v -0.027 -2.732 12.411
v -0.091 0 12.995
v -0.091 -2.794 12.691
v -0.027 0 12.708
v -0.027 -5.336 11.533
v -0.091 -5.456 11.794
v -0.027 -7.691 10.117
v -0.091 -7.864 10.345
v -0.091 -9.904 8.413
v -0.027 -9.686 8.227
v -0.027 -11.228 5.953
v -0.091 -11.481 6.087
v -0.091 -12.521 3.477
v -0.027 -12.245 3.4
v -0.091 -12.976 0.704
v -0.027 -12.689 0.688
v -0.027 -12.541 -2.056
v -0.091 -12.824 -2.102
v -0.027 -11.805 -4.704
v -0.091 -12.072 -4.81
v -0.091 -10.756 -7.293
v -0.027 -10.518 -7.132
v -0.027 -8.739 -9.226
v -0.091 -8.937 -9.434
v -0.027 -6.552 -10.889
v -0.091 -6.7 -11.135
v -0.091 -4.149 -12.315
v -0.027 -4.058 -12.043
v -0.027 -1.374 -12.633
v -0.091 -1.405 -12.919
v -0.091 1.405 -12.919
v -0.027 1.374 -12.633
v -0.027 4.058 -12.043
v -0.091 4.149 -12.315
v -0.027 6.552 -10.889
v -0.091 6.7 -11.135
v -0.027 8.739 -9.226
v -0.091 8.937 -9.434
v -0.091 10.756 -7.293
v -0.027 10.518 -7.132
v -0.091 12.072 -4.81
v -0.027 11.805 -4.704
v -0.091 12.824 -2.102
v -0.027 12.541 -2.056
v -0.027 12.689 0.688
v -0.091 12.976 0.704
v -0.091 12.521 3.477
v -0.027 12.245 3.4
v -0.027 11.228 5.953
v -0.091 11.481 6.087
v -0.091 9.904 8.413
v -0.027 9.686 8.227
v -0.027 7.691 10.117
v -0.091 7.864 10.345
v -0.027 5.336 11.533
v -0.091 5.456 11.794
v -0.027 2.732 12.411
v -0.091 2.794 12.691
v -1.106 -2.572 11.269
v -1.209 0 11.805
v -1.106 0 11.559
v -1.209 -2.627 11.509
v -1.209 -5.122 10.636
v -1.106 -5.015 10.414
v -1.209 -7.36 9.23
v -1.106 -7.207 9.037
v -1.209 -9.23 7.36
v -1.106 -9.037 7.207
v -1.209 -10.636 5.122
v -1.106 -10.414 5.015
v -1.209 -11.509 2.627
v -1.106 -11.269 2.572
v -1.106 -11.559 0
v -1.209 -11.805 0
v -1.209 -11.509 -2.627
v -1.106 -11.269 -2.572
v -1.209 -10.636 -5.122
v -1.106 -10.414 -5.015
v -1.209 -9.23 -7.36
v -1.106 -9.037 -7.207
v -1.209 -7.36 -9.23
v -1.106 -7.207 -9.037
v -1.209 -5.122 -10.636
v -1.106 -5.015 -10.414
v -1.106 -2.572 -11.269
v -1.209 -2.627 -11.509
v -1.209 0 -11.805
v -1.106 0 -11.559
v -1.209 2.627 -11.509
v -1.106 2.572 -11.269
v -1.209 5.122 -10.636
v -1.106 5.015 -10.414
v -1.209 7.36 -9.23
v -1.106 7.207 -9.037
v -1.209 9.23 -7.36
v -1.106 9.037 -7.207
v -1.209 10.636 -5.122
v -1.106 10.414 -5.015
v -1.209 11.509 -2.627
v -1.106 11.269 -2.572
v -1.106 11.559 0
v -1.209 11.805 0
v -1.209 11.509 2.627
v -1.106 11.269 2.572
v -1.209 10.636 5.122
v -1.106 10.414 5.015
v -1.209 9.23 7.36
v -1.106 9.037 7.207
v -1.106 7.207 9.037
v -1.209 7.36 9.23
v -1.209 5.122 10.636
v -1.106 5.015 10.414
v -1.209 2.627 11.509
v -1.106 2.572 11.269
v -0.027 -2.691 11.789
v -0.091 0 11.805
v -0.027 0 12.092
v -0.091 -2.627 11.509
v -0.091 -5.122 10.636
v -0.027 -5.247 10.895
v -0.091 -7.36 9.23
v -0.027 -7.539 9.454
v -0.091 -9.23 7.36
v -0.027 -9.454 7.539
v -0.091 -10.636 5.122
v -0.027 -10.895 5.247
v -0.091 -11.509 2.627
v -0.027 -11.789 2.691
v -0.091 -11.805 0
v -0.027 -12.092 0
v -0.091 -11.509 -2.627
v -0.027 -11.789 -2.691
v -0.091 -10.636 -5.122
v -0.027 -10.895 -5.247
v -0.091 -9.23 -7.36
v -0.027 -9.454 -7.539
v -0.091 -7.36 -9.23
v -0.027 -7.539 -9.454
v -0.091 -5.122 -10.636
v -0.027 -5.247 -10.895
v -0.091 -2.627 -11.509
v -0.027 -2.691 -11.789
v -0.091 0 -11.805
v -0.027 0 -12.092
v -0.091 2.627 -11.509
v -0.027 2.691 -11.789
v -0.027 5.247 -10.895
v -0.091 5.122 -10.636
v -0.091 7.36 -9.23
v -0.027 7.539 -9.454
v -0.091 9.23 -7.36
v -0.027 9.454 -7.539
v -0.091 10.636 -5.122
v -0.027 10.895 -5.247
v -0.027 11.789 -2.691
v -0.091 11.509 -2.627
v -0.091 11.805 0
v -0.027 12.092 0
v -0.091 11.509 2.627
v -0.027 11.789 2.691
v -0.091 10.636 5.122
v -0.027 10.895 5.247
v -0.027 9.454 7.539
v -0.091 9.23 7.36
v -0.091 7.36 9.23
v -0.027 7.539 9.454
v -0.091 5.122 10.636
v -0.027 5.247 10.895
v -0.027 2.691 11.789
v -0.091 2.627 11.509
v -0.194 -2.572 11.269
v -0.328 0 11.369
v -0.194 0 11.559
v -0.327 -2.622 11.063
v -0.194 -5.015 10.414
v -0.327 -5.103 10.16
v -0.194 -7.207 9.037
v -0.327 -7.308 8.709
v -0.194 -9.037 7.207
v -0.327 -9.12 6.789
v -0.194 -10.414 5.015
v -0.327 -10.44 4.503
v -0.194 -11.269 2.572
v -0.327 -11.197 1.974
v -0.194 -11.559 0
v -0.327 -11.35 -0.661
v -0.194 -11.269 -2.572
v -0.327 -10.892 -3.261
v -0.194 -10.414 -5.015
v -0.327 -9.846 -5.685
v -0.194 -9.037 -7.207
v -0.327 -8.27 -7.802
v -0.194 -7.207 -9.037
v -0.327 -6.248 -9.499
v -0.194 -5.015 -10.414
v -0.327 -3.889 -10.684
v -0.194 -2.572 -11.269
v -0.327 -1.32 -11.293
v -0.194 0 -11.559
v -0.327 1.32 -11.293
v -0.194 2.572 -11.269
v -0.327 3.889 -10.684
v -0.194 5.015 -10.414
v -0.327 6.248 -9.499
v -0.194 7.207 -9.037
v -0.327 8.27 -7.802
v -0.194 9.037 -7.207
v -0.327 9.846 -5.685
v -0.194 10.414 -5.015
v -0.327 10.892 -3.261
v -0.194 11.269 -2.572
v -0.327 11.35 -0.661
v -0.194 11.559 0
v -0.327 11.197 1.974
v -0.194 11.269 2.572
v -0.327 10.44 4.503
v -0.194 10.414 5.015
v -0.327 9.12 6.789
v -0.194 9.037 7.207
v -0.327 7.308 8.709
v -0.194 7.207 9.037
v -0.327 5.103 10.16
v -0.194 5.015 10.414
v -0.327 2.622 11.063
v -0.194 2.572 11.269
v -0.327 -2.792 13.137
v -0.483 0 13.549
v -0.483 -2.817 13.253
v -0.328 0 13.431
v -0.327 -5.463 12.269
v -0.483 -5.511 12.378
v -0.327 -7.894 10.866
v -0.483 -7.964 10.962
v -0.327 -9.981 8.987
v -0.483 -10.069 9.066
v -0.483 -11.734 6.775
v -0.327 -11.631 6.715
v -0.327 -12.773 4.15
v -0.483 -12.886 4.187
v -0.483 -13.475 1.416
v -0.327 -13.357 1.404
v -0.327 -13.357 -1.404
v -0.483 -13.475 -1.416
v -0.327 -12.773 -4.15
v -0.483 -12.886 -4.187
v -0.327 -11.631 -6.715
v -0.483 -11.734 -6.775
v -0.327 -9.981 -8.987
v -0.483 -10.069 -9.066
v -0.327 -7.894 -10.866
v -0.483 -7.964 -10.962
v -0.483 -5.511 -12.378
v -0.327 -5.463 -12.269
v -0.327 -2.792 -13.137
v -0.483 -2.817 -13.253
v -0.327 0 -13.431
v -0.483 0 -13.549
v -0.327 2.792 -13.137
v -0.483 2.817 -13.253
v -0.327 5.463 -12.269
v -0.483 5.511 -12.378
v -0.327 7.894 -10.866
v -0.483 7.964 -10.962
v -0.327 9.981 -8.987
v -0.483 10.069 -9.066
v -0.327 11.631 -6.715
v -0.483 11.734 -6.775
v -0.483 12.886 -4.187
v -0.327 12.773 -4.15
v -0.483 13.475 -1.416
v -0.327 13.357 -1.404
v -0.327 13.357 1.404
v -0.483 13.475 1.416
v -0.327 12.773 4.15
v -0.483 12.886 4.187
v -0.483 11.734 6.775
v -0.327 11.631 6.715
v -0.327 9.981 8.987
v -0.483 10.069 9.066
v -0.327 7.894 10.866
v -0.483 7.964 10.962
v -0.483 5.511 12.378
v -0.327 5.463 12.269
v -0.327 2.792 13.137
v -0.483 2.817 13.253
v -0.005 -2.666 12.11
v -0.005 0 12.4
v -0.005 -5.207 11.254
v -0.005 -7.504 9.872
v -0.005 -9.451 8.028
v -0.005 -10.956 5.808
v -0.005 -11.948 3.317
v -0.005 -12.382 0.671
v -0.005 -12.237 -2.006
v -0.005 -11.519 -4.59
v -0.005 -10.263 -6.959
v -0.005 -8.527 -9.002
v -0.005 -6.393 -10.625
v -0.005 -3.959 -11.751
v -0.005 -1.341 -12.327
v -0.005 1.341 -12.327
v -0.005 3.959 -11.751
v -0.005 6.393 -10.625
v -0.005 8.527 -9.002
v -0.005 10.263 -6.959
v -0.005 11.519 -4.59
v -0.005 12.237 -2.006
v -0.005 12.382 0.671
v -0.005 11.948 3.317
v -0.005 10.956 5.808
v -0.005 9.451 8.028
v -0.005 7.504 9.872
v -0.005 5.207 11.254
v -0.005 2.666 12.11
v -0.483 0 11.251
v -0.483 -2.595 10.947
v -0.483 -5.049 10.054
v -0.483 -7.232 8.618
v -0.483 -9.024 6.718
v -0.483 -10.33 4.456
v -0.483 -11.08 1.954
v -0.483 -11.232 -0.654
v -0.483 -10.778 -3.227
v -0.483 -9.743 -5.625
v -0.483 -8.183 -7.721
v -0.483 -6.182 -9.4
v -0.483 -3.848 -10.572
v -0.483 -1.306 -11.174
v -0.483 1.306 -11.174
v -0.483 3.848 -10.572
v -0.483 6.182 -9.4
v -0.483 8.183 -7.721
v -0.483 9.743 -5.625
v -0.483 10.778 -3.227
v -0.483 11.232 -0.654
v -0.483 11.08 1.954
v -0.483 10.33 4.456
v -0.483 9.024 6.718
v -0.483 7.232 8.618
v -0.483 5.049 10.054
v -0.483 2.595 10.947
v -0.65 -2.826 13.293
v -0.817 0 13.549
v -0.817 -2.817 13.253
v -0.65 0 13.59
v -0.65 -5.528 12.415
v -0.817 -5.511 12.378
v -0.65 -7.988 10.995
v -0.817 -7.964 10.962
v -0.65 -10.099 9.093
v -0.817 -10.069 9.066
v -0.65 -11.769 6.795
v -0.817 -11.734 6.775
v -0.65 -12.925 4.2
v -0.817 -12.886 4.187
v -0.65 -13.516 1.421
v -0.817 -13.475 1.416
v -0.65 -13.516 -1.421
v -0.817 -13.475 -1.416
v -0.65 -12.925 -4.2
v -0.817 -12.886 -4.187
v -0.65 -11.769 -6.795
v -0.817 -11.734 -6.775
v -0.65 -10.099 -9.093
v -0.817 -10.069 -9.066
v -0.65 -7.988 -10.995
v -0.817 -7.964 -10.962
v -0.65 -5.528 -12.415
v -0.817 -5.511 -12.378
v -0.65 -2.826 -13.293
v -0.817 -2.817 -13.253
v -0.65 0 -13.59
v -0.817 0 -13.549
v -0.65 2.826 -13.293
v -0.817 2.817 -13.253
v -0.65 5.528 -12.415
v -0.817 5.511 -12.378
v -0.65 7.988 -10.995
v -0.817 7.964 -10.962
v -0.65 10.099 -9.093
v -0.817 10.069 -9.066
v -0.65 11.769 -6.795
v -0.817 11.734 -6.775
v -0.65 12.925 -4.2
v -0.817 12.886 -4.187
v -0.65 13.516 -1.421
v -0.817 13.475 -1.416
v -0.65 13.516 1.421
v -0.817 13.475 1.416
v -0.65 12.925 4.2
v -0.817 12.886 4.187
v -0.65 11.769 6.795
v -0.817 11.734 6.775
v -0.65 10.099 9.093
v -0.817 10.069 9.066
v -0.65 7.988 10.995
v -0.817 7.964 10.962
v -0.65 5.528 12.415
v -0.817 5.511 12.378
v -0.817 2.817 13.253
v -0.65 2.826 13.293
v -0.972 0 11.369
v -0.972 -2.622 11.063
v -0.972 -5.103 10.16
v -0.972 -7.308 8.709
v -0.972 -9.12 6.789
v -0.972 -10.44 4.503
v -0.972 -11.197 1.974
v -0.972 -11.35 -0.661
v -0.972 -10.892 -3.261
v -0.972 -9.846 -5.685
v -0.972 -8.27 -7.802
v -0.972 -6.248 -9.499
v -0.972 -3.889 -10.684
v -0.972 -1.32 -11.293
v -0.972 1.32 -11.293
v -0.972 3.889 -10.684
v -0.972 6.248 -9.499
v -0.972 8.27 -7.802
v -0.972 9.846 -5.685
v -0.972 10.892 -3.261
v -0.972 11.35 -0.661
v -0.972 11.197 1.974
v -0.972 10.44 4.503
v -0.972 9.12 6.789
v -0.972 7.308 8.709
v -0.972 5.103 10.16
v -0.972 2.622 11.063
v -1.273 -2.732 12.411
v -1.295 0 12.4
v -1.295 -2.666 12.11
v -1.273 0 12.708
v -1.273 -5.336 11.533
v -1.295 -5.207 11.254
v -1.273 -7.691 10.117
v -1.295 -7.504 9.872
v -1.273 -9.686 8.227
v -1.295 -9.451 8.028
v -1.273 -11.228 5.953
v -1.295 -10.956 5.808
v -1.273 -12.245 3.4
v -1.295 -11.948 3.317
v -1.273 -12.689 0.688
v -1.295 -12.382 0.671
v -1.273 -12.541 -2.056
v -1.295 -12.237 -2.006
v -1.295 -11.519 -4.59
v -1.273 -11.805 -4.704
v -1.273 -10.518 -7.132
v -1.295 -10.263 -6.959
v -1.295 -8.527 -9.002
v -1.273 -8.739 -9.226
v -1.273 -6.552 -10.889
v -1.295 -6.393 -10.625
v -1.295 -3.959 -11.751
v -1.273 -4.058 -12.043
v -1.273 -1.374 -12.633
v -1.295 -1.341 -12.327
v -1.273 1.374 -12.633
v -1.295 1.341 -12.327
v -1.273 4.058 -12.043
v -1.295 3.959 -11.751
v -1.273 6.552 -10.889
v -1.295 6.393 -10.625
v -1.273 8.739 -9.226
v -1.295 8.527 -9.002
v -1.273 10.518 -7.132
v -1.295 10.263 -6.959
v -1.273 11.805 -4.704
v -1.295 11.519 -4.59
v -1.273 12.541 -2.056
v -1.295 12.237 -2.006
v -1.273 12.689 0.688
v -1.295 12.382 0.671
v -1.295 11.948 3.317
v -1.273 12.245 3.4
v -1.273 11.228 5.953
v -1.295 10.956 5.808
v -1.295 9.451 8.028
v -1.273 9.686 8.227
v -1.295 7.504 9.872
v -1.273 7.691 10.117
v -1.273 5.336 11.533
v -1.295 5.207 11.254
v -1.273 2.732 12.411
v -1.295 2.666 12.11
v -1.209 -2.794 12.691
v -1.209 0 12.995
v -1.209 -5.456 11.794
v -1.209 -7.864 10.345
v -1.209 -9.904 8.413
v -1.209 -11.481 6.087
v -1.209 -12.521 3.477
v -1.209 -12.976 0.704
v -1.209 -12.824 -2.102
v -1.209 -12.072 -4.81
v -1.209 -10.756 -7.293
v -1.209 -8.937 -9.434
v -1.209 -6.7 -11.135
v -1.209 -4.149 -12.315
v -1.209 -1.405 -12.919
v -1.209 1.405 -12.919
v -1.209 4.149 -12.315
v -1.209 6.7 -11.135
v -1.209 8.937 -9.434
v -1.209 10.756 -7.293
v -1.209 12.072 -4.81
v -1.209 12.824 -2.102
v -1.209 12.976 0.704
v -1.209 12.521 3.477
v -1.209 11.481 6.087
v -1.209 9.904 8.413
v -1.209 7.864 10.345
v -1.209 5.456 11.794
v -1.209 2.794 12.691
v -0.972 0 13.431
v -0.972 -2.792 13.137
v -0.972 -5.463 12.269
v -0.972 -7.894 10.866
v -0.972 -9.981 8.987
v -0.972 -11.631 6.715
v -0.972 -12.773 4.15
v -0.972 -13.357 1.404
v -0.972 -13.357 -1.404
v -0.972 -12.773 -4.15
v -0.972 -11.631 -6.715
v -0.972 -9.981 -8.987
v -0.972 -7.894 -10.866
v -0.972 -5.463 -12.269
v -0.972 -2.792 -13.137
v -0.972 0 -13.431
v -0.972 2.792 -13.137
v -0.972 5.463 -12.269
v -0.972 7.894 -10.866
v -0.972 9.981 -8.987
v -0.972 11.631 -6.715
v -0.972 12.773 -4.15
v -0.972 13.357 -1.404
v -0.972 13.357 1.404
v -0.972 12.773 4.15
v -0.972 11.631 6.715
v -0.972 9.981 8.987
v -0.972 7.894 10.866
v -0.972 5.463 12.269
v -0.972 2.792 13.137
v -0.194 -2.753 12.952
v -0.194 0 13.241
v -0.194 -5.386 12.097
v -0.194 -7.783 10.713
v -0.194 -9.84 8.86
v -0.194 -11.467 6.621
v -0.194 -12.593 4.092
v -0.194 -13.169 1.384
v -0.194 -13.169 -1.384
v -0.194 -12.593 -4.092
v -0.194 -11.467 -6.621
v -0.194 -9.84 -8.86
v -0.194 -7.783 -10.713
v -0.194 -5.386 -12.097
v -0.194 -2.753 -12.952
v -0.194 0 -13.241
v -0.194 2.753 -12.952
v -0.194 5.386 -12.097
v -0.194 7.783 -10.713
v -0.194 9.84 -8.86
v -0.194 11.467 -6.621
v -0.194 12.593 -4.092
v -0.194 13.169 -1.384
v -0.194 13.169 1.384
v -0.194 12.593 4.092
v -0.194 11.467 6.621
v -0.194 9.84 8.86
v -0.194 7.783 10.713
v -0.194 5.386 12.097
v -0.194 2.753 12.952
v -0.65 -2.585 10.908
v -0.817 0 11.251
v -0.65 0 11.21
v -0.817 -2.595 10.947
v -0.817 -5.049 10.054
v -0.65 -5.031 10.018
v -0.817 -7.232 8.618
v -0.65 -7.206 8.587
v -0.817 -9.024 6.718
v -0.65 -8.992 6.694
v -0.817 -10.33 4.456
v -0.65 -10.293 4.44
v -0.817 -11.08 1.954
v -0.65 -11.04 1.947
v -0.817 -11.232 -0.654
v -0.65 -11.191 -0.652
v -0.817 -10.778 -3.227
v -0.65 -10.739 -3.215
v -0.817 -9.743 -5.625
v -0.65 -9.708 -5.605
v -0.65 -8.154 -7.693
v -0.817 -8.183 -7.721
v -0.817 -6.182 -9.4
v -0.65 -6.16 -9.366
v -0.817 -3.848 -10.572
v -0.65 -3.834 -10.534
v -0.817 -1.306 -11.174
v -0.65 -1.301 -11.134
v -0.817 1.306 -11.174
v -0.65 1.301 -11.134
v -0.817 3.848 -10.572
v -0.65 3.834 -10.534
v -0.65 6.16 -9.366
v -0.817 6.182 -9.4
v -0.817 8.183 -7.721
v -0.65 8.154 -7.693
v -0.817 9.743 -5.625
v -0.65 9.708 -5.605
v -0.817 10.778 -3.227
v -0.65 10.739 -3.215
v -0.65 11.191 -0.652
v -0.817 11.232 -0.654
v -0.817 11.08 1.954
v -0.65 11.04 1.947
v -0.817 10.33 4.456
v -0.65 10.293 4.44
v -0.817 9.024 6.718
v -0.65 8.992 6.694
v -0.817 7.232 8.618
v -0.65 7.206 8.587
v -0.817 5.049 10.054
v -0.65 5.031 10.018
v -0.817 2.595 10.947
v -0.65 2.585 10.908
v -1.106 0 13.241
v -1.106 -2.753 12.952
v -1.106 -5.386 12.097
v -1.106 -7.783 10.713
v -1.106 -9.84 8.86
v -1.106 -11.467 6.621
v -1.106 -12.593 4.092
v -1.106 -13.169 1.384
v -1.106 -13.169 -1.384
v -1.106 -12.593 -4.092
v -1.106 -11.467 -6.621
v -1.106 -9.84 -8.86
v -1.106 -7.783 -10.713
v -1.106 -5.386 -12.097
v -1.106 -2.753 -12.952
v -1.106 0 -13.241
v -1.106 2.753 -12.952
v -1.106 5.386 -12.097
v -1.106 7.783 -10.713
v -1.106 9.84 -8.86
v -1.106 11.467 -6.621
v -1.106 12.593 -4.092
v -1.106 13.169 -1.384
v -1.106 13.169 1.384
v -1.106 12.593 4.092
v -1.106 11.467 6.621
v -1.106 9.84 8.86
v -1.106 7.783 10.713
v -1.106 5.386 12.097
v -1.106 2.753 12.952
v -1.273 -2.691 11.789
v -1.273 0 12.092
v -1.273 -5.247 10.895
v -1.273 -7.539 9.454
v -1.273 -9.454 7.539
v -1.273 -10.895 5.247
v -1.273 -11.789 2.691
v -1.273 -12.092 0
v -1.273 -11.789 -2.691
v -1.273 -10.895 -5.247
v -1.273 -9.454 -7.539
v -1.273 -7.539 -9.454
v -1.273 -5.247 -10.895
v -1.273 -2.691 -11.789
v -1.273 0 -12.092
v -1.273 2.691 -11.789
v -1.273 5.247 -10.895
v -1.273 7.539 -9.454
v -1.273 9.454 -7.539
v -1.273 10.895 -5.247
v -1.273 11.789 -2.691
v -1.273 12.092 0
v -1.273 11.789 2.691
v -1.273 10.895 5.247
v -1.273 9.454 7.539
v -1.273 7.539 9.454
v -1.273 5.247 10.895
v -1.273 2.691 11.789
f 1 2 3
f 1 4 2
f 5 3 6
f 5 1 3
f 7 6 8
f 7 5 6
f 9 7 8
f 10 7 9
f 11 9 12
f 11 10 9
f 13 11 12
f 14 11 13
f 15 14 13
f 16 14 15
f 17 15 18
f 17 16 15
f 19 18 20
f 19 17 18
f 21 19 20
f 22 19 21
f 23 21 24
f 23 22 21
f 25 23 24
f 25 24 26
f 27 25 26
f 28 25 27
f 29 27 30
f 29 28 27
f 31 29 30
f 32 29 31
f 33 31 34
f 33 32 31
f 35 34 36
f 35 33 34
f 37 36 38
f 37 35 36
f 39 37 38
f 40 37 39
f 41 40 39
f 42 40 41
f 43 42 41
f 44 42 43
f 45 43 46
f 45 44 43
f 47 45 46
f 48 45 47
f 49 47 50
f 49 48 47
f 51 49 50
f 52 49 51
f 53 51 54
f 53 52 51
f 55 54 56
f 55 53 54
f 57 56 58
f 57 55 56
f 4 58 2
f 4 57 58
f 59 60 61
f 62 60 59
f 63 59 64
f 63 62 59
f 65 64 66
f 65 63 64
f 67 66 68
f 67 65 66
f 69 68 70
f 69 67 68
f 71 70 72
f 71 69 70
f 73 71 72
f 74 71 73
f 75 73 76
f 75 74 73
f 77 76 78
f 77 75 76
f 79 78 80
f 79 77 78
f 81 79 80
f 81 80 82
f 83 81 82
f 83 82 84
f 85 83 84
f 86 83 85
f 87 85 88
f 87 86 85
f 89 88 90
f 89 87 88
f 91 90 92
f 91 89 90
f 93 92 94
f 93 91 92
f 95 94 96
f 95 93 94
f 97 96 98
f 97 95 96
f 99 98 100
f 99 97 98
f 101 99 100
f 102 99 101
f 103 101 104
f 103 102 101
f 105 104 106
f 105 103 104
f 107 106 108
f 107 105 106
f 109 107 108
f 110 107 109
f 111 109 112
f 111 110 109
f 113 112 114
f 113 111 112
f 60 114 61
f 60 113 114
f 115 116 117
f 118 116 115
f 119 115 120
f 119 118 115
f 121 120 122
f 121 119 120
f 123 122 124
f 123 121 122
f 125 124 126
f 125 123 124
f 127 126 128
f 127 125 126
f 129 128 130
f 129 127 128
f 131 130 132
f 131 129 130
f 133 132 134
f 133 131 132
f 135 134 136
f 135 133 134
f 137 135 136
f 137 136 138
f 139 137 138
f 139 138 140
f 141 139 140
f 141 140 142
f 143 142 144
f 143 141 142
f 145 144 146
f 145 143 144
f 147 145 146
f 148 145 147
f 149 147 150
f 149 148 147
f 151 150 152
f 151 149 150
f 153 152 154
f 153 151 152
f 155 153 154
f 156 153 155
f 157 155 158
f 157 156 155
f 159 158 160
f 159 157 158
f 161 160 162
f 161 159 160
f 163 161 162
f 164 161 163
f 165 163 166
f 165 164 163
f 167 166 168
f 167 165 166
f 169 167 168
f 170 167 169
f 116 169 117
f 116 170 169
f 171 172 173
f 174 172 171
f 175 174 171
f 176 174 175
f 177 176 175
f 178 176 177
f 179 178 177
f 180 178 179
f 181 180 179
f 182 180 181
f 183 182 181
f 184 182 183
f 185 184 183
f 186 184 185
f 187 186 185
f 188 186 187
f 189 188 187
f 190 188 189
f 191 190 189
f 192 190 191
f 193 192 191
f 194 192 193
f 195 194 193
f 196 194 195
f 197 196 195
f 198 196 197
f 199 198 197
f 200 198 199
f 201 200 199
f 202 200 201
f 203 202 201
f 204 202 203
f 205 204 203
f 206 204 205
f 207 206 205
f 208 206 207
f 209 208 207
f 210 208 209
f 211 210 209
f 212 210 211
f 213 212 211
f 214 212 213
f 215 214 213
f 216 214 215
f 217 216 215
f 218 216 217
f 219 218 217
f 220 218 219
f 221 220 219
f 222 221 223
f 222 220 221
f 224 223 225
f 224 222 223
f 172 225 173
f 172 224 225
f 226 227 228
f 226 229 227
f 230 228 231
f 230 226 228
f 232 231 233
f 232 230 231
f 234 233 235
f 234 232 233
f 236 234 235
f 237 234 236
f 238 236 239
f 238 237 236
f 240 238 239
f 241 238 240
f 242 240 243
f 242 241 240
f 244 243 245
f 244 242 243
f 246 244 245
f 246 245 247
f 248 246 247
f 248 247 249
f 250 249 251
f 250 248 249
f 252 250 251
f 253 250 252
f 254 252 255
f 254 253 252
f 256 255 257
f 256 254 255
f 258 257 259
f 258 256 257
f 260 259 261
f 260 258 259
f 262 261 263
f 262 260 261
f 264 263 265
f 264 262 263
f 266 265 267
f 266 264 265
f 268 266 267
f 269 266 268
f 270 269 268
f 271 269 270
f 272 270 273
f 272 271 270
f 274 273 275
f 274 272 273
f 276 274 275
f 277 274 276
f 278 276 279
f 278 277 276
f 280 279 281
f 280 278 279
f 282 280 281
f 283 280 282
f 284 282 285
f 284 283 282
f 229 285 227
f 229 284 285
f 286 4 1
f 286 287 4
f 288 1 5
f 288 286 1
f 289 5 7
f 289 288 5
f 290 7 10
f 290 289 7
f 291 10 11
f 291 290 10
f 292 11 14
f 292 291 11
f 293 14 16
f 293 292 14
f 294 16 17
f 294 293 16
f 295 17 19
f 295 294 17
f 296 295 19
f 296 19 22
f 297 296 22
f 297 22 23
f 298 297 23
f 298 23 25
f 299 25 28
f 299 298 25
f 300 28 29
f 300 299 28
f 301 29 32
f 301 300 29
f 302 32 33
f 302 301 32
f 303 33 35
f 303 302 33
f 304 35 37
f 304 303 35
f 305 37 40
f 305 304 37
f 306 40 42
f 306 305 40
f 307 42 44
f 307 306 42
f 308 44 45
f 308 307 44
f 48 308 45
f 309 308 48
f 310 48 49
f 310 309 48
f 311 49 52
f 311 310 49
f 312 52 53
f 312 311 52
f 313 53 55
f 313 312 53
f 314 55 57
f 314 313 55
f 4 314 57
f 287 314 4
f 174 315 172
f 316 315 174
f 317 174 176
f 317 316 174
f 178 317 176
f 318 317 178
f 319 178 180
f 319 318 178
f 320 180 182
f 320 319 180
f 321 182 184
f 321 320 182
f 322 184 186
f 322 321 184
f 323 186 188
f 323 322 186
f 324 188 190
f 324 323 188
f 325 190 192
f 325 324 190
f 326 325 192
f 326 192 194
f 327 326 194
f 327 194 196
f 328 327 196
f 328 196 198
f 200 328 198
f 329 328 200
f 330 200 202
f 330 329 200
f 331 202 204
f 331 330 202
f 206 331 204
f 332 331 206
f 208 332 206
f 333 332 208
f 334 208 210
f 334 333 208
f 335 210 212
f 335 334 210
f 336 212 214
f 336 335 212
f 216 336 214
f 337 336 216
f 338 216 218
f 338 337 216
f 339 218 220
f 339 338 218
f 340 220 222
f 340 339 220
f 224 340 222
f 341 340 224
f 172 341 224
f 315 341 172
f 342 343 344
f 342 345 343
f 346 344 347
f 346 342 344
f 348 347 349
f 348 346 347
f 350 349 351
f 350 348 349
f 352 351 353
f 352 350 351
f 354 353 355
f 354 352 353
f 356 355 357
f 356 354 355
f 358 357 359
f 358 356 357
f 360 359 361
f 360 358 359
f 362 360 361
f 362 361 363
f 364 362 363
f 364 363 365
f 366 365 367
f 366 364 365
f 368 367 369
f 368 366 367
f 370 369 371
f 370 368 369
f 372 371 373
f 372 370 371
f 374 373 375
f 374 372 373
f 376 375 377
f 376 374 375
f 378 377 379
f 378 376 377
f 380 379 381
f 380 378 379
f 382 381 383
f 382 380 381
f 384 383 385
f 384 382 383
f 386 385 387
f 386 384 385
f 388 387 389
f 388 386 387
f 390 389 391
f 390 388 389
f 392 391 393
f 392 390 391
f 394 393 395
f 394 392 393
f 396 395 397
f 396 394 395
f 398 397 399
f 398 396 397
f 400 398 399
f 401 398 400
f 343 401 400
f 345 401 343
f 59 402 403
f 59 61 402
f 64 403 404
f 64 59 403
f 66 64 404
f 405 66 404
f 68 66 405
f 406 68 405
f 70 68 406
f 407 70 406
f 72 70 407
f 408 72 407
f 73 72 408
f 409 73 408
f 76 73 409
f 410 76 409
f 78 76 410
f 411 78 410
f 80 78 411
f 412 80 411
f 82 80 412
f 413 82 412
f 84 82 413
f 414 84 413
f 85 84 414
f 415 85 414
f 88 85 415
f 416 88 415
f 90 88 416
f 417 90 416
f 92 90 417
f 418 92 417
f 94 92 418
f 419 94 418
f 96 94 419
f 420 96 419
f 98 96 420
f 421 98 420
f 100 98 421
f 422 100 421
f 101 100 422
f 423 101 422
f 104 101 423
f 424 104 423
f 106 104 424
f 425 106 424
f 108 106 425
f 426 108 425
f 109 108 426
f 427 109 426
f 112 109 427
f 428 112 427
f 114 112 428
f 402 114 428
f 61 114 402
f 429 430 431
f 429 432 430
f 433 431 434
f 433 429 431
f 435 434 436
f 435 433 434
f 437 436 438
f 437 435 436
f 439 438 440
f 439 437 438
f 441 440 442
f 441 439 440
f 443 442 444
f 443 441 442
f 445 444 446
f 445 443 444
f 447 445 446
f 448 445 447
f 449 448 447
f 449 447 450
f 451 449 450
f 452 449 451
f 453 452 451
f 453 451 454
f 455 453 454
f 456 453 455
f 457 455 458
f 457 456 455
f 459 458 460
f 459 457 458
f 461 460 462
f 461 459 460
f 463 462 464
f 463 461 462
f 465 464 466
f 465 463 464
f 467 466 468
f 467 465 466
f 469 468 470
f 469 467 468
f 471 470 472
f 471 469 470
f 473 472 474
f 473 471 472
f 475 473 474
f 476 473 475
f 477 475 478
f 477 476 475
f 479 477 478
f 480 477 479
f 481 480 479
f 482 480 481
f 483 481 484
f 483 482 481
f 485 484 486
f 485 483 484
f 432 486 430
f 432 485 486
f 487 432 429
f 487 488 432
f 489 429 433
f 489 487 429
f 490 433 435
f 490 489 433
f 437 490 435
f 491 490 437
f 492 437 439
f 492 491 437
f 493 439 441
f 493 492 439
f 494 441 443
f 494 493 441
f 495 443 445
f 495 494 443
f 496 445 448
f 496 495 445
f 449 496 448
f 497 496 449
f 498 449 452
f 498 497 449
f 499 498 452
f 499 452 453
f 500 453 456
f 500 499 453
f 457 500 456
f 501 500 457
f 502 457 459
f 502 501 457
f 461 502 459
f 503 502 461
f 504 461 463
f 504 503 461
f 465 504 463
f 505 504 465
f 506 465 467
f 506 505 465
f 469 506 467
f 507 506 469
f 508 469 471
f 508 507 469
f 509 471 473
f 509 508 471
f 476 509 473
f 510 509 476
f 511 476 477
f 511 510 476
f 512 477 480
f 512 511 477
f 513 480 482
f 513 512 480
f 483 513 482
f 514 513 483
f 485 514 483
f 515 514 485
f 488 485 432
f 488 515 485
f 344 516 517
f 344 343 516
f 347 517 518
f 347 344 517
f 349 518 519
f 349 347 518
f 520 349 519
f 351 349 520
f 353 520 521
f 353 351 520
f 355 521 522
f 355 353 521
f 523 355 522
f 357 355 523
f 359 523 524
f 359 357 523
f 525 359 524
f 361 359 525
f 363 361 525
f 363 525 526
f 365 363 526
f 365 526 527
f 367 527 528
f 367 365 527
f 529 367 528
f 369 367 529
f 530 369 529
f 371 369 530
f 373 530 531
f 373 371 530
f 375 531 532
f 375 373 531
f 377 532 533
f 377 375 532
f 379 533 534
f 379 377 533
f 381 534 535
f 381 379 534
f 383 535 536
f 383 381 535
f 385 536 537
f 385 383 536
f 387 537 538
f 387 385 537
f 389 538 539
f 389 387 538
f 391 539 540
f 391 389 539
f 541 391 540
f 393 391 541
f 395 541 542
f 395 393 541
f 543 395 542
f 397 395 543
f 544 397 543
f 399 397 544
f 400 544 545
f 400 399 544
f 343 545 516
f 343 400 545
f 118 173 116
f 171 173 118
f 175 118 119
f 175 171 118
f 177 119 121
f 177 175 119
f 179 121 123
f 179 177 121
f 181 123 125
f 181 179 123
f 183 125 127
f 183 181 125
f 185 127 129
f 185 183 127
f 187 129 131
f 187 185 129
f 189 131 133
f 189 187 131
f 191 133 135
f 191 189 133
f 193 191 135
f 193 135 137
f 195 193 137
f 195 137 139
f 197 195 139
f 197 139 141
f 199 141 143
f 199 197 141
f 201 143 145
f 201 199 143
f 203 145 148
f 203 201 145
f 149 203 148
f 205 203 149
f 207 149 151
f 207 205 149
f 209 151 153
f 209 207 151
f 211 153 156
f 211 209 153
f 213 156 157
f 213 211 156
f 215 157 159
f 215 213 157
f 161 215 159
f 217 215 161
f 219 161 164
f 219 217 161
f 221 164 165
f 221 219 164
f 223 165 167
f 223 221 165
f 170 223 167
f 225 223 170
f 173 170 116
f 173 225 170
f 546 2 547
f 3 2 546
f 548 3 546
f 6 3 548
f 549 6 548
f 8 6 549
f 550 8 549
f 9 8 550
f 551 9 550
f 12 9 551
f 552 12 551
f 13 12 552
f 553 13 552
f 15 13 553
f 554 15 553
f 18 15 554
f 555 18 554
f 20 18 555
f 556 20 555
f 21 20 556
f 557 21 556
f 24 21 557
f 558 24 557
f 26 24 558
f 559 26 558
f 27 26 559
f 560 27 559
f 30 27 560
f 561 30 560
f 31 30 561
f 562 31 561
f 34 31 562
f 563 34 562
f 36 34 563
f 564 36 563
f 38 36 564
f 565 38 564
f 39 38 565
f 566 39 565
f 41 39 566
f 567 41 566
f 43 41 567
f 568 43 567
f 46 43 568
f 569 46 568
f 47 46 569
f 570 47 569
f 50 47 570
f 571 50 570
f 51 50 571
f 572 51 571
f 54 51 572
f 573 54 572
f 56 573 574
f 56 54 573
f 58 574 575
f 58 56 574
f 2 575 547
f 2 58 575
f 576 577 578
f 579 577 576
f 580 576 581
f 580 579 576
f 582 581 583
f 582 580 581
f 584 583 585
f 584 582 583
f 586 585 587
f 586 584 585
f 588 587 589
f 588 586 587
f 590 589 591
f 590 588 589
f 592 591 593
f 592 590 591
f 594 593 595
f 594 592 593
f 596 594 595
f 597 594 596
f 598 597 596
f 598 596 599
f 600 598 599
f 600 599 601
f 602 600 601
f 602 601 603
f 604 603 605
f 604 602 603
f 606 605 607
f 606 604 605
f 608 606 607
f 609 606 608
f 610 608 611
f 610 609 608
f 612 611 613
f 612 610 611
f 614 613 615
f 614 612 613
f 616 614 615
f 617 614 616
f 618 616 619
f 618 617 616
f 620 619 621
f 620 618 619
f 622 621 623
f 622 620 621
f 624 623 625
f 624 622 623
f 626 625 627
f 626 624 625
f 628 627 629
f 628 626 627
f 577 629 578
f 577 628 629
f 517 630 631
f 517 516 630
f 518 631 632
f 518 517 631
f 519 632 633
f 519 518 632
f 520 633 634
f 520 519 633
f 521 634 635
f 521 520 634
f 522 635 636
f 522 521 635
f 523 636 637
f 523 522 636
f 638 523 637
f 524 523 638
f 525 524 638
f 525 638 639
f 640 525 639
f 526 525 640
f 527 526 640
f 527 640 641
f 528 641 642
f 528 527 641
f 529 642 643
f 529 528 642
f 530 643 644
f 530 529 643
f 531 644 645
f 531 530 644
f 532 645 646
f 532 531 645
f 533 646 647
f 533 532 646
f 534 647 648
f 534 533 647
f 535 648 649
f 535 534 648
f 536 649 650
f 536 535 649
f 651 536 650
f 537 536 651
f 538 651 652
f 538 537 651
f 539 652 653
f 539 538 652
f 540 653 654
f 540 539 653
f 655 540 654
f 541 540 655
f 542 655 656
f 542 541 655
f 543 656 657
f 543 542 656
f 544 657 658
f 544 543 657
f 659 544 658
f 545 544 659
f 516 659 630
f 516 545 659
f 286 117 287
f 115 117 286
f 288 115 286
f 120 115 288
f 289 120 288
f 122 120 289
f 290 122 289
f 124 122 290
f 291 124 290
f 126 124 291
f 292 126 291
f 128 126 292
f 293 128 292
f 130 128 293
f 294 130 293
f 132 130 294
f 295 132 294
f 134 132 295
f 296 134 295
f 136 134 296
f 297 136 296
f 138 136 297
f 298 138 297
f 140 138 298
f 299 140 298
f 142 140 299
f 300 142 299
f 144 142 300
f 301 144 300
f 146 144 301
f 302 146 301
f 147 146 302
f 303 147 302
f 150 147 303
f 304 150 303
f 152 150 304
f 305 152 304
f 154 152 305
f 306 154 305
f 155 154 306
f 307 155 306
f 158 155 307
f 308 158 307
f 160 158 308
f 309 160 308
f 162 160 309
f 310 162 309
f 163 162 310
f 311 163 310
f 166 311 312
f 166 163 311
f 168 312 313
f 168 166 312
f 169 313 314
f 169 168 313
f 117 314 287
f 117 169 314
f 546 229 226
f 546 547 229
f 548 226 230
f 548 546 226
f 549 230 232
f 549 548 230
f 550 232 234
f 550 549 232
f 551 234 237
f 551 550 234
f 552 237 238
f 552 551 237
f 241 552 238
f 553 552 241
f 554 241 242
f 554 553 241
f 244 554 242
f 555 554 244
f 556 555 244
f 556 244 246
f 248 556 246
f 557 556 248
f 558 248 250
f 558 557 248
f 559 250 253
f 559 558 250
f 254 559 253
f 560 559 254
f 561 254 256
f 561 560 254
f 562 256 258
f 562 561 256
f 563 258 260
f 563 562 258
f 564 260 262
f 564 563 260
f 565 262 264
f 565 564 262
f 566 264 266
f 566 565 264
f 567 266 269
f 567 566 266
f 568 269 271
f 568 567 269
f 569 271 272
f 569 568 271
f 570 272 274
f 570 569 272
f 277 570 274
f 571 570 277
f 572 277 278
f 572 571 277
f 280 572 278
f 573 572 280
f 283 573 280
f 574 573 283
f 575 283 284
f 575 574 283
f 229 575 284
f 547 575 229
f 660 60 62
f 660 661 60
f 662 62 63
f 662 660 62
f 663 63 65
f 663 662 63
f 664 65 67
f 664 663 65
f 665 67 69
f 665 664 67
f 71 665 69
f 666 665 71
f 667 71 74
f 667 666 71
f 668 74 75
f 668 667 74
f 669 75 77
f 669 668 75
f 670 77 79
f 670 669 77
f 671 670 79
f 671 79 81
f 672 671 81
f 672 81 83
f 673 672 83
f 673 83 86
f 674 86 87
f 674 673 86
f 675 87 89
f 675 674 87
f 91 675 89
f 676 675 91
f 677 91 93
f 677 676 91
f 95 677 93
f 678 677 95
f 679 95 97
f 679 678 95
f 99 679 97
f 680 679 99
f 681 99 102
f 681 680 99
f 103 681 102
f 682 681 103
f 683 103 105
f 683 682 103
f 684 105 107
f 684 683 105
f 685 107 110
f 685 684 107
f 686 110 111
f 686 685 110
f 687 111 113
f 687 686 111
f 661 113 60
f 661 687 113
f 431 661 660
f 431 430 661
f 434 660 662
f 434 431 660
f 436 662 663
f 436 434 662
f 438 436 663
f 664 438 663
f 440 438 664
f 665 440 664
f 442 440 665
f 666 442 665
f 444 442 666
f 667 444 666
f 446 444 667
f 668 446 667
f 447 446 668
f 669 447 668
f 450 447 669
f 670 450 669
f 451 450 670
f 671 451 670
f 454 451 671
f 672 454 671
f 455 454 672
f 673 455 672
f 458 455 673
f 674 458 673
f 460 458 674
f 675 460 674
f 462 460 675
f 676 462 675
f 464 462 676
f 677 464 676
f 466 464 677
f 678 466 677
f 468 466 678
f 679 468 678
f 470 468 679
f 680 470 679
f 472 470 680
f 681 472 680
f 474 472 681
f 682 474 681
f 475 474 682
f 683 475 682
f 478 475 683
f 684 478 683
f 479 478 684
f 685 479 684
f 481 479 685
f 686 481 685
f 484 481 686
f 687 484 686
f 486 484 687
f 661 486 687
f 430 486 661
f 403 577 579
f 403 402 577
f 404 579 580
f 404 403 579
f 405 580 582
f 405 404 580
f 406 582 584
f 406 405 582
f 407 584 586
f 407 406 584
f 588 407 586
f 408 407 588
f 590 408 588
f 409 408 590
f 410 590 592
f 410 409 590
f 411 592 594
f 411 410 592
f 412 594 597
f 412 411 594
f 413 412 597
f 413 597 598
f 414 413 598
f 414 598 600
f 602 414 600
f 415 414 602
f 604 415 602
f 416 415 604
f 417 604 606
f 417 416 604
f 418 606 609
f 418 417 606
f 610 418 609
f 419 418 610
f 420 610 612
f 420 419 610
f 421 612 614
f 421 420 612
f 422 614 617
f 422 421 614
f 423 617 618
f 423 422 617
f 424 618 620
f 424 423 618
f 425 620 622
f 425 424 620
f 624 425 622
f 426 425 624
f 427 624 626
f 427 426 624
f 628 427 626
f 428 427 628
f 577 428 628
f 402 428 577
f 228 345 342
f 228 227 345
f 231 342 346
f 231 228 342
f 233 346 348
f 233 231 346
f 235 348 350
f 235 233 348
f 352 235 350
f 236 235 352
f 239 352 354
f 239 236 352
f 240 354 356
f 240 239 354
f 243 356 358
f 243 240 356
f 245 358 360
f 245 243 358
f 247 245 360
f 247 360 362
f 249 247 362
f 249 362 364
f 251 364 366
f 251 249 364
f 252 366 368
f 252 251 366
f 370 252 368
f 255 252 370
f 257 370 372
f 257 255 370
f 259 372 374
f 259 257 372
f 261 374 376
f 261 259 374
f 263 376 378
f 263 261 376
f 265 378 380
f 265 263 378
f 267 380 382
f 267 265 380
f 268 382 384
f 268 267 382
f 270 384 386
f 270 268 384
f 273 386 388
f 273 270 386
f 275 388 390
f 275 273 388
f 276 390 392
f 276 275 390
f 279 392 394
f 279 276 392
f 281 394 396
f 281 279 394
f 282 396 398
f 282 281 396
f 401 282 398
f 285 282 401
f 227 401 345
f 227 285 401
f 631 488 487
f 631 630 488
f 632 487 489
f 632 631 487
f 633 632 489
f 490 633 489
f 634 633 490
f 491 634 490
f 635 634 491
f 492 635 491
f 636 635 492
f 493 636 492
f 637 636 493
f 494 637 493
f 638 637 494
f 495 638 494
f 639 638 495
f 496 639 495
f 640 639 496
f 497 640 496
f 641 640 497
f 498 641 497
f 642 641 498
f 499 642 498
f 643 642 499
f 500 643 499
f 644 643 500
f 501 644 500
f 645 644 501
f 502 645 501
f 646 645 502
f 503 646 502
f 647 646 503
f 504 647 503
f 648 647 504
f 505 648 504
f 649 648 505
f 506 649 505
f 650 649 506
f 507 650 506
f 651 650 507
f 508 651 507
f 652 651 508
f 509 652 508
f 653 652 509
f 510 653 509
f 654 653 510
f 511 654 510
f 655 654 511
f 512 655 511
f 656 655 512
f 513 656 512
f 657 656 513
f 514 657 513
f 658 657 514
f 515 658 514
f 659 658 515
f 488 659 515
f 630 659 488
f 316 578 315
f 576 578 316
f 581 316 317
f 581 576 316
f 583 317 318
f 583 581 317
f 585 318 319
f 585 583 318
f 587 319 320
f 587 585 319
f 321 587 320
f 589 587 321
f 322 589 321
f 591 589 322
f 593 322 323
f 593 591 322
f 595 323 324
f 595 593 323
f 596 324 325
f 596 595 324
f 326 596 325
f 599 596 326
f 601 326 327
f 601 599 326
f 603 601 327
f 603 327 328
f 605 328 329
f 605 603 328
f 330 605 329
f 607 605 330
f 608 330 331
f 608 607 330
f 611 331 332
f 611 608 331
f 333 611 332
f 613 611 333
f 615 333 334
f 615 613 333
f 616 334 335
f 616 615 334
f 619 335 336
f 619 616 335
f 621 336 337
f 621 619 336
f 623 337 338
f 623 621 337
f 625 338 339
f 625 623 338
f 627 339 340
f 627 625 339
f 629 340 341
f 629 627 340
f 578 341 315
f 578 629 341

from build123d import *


with BuildPart() as part:
    # O_Ring_Pintle Sketch → O_Ring_Pintle (revolve)
    with BuildSketch(Plane.XY):
        Polygon((-1.295, 12.4), (-1.273022158, 12.707994664), (-1.208586385, 12.995), (-1.106083874, 13.24145707), (-0.9725, 13.430570231), (-0.816938284, 13.549451733), (-0.65, 13.59), (-0.483061716, 13.549451733), (-0.3275, 13.430570231), (-0.193916126, 13.24145707), (-0.091413615, 12.995), (-0.026977842, 12.707994664), (-0.005, 12.4), (-0.026977842, 12.092005336), (-0.091413615, 11.805), (-0.193916126, 11.55854293), (-0.3275, 11.369429769), (-0.483061716, 11.250548267), (-0.65, 11.21), (-0.816938284, 11.250548267), (-0.9725, 11.369429769), (-1.106083874, 11.55854293), (-1.208586385, 11.805), (-1.273022158, 12.092005336), align=None)
    revolve(axis=Axis((-1000, 0, 0), (1, 0, 0)))


solid = part.part
